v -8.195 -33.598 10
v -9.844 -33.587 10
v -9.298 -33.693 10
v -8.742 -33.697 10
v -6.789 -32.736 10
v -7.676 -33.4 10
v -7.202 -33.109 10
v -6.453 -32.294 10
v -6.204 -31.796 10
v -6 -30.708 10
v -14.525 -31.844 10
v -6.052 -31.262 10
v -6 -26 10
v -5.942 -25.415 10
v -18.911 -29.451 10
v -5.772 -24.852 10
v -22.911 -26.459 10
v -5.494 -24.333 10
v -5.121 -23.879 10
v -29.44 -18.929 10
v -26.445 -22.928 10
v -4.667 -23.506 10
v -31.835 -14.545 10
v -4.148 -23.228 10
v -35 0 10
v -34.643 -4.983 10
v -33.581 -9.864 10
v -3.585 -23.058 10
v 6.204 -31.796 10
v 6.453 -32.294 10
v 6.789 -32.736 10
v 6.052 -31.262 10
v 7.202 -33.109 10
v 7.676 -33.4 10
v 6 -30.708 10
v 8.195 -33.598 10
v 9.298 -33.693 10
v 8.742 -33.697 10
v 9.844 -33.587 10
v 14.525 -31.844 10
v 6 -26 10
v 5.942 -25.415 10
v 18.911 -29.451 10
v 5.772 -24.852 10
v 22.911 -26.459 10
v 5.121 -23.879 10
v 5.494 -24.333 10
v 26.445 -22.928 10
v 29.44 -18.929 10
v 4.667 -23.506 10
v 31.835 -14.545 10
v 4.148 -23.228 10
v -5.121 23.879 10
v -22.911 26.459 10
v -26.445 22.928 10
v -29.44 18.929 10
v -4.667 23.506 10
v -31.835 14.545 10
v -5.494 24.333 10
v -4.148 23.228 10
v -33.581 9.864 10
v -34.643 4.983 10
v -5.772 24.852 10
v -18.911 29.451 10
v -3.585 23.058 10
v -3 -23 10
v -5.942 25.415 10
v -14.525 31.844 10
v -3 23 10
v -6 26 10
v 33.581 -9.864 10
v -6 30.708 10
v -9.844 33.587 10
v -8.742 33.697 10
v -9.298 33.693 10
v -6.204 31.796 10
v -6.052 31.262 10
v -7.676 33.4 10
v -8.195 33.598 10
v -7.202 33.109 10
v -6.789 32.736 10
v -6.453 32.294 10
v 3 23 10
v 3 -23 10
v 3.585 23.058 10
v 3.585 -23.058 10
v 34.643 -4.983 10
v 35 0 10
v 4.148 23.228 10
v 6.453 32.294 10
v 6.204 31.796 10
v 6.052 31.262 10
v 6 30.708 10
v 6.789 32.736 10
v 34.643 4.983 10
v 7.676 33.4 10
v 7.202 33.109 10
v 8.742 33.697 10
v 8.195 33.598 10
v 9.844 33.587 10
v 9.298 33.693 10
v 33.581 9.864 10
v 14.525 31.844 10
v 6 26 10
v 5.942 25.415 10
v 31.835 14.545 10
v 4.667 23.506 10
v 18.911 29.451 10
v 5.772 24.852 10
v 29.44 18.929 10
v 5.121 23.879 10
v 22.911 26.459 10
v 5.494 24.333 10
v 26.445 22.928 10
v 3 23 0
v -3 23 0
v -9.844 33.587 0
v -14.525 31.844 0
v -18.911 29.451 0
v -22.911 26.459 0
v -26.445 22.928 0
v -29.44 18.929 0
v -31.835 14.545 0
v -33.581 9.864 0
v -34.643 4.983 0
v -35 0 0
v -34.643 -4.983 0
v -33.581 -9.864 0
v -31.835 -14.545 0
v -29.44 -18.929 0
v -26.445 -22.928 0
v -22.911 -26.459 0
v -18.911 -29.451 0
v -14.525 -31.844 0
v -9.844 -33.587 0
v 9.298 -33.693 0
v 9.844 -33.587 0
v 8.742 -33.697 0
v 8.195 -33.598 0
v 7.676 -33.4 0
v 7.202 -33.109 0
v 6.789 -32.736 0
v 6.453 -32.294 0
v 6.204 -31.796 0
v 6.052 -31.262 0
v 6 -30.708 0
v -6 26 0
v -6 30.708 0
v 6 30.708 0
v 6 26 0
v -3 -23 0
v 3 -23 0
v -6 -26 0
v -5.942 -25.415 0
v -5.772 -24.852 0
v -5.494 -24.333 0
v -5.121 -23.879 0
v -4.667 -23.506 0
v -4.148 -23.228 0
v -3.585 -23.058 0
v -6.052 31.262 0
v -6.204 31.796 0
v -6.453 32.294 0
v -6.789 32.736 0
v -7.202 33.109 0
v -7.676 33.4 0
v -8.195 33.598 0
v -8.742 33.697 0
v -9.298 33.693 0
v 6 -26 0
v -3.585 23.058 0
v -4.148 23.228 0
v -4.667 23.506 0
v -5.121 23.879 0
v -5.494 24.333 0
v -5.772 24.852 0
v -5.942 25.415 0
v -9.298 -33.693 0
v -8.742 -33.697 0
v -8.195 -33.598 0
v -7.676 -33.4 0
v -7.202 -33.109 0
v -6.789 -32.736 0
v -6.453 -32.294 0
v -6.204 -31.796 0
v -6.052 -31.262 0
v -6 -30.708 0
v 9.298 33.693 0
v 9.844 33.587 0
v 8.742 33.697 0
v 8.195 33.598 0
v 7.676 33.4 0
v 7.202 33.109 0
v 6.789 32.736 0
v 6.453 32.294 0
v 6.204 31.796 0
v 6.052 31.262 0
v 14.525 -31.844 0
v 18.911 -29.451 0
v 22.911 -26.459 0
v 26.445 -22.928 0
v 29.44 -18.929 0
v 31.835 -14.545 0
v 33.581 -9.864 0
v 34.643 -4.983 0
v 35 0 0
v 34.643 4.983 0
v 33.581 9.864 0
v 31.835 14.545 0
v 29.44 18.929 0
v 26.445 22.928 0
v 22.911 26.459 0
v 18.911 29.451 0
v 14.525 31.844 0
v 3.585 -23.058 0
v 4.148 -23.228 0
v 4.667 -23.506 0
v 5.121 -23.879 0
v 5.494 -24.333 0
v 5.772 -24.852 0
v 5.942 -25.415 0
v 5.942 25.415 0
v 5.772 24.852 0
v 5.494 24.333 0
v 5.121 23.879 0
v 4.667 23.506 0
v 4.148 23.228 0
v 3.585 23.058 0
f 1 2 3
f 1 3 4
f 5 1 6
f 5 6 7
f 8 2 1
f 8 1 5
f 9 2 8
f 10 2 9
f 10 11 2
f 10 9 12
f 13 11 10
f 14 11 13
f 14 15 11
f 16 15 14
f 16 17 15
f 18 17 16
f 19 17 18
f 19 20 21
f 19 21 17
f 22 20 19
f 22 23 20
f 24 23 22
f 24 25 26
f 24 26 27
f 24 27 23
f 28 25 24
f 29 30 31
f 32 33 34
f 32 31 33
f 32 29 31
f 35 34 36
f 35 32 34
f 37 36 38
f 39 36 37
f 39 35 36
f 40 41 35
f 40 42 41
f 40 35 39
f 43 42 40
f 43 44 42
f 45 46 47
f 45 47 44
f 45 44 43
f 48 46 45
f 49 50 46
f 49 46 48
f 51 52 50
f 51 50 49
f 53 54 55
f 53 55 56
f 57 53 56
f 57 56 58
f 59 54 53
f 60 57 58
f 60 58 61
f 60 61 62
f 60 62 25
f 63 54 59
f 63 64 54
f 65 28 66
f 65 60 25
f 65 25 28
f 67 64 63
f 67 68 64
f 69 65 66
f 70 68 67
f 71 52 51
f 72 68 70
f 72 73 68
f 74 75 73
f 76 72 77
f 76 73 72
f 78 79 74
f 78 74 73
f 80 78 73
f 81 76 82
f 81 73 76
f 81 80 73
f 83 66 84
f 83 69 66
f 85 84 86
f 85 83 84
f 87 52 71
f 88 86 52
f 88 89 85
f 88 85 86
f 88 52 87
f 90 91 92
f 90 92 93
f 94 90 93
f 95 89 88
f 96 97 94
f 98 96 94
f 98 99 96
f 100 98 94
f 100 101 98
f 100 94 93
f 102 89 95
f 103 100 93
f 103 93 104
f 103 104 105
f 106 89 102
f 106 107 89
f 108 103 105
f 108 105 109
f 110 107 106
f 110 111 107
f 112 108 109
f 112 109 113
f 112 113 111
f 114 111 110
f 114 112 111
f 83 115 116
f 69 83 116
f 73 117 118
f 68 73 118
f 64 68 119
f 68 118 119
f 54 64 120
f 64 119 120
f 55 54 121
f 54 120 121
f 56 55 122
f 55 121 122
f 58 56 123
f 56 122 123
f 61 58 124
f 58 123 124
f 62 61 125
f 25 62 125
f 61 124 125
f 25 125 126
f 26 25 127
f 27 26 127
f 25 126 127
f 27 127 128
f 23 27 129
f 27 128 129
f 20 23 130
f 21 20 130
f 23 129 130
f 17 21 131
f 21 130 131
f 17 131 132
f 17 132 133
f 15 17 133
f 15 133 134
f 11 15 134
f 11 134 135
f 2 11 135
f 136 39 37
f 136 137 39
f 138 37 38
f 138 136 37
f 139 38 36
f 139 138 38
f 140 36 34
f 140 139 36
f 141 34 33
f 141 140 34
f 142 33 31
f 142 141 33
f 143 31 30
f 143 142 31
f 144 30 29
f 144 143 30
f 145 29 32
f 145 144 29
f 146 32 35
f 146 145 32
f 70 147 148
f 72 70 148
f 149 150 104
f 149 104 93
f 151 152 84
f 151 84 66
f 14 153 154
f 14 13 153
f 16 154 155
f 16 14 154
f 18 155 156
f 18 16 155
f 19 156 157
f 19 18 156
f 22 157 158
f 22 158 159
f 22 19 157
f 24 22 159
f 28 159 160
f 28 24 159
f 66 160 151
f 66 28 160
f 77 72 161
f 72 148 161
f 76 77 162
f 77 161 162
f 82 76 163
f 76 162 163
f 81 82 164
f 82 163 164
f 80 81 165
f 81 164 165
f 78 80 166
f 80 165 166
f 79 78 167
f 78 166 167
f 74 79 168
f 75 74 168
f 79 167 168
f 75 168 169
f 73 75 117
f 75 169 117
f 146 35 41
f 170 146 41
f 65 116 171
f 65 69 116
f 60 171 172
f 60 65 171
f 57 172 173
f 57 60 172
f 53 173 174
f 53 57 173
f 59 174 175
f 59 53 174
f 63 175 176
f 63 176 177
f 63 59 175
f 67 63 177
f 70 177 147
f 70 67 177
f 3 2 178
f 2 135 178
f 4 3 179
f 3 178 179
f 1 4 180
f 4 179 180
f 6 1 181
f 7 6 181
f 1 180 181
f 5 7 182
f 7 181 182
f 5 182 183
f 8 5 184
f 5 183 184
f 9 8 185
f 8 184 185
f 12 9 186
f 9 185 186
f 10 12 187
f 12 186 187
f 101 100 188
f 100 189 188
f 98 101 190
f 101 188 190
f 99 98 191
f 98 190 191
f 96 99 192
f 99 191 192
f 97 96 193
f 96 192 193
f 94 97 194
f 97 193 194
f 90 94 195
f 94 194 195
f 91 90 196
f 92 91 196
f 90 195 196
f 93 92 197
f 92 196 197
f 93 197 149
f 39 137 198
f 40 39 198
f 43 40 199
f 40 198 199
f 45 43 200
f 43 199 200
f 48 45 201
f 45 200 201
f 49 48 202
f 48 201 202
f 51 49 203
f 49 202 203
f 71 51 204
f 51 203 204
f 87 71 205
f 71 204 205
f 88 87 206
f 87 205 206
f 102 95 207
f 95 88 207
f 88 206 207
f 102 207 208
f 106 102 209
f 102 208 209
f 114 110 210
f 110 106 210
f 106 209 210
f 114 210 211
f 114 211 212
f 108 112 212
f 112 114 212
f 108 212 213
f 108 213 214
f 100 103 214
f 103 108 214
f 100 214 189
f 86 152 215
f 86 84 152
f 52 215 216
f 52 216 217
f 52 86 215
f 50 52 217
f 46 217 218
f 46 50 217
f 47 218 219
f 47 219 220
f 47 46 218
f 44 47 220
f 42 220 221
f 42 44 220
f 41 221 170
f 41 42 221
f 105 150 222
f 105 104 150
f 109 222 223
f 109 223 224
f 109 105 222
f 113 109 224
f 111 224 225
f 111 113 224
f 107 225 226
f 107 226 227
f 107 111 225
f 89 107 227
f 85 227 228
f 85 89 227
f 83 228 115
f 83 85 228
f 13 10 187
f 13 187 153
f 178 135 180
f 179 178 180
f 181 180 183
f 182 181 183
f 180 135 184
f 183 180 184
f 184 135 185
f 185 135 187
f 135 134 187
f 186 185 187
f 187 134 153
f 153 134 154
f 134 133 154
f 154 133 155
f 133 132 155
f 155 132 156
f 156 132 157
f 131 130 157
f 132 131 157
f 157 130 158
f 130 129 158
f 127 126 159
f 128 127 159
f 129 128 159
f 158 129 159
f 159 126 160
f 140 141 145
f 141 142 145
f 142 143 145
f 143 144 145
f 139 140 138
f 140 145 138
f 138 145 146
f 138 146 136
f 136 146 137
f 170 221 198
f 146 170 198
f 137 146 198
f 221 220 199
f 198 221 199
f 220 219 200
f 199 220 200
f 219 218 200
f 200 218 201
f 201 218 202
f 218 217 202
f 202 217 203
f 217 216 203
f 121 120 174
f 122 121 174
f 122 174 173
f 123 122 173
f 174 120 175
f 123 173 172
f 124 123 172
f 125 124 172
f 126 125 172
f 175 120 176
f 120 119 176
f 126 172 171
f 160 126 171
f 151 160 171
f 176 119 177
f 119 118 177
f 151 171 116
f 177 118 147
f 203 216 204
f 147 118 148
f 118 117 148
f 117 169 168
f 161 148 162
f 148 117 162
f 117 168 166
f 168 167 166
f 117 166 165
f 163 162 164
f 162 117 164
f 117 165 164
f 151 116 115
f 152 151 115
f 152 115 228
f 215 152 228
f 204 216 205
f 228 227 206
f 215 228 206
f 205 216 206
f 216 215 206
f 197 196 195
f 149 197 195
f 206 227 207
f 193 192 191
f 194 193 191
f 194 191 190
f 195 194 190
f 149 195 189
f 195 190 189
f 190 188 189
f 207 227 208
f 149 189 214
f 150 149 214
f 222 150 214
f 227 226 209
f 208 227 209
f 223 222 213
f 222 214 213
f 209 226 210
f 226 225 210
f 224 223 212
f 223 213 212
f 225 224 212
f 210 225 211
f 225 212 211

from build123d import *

# Parameters (mm, degrees)
IZIM1_R                     = 35
Y_KSEKLIK_EKSTR_ZYON1_DEPTH = 10
IZIM2_W                     = 12
IZIM2_H                     = 12
KES_EKSTR_ZYON1_DEPTH       = 16
RADYUS1_R                   = 3


with BuildPart() as part:
    # Çizim1 → Yükseklik-Ekstrüzyon1 (new body)
    with BuildSketch(Plane.XY):
        Circle(IZIM1_R)
    extrude(amount=Y_KSEKLIK_EKSTR_ZYON1_DEPTH)

    # Çizim2 → Kes-Ekstrüzyon1 (cut)
    with BuildSketch(Plane(origin=(0, 0, 0), x_dir=(-1, 0, 0), z_dir=(0, 0, -1))):
        with Locations((0, 29)):
            Rectangle(IZIM2_W, IZIM2_H)
        with Locations((0, -29)):
            Rectangle(IZIM2_W, IZIM2_H)
    extrude(amount=-KES_EKSTR_ZYON1_DEPTH, mode=Mode.SUBTRACT)

    # Radyus1
    radyus1_edges = [part.edges().sort_by_distance(p)[0] for p in [
        (-6, 34.481879299, 5),
        (6, 34.481879299, 5),
        (6, 23, 5),
        (-6, 23, 5),
        (-6, -34.481879299, 5),
        (-6, -23, 5),
        (6, -34.481879299, 5),
        (6, -23, 5),
    ]]
    fillet(radyus1_edges, radius=RADYUS1_R)


solid = part.part
